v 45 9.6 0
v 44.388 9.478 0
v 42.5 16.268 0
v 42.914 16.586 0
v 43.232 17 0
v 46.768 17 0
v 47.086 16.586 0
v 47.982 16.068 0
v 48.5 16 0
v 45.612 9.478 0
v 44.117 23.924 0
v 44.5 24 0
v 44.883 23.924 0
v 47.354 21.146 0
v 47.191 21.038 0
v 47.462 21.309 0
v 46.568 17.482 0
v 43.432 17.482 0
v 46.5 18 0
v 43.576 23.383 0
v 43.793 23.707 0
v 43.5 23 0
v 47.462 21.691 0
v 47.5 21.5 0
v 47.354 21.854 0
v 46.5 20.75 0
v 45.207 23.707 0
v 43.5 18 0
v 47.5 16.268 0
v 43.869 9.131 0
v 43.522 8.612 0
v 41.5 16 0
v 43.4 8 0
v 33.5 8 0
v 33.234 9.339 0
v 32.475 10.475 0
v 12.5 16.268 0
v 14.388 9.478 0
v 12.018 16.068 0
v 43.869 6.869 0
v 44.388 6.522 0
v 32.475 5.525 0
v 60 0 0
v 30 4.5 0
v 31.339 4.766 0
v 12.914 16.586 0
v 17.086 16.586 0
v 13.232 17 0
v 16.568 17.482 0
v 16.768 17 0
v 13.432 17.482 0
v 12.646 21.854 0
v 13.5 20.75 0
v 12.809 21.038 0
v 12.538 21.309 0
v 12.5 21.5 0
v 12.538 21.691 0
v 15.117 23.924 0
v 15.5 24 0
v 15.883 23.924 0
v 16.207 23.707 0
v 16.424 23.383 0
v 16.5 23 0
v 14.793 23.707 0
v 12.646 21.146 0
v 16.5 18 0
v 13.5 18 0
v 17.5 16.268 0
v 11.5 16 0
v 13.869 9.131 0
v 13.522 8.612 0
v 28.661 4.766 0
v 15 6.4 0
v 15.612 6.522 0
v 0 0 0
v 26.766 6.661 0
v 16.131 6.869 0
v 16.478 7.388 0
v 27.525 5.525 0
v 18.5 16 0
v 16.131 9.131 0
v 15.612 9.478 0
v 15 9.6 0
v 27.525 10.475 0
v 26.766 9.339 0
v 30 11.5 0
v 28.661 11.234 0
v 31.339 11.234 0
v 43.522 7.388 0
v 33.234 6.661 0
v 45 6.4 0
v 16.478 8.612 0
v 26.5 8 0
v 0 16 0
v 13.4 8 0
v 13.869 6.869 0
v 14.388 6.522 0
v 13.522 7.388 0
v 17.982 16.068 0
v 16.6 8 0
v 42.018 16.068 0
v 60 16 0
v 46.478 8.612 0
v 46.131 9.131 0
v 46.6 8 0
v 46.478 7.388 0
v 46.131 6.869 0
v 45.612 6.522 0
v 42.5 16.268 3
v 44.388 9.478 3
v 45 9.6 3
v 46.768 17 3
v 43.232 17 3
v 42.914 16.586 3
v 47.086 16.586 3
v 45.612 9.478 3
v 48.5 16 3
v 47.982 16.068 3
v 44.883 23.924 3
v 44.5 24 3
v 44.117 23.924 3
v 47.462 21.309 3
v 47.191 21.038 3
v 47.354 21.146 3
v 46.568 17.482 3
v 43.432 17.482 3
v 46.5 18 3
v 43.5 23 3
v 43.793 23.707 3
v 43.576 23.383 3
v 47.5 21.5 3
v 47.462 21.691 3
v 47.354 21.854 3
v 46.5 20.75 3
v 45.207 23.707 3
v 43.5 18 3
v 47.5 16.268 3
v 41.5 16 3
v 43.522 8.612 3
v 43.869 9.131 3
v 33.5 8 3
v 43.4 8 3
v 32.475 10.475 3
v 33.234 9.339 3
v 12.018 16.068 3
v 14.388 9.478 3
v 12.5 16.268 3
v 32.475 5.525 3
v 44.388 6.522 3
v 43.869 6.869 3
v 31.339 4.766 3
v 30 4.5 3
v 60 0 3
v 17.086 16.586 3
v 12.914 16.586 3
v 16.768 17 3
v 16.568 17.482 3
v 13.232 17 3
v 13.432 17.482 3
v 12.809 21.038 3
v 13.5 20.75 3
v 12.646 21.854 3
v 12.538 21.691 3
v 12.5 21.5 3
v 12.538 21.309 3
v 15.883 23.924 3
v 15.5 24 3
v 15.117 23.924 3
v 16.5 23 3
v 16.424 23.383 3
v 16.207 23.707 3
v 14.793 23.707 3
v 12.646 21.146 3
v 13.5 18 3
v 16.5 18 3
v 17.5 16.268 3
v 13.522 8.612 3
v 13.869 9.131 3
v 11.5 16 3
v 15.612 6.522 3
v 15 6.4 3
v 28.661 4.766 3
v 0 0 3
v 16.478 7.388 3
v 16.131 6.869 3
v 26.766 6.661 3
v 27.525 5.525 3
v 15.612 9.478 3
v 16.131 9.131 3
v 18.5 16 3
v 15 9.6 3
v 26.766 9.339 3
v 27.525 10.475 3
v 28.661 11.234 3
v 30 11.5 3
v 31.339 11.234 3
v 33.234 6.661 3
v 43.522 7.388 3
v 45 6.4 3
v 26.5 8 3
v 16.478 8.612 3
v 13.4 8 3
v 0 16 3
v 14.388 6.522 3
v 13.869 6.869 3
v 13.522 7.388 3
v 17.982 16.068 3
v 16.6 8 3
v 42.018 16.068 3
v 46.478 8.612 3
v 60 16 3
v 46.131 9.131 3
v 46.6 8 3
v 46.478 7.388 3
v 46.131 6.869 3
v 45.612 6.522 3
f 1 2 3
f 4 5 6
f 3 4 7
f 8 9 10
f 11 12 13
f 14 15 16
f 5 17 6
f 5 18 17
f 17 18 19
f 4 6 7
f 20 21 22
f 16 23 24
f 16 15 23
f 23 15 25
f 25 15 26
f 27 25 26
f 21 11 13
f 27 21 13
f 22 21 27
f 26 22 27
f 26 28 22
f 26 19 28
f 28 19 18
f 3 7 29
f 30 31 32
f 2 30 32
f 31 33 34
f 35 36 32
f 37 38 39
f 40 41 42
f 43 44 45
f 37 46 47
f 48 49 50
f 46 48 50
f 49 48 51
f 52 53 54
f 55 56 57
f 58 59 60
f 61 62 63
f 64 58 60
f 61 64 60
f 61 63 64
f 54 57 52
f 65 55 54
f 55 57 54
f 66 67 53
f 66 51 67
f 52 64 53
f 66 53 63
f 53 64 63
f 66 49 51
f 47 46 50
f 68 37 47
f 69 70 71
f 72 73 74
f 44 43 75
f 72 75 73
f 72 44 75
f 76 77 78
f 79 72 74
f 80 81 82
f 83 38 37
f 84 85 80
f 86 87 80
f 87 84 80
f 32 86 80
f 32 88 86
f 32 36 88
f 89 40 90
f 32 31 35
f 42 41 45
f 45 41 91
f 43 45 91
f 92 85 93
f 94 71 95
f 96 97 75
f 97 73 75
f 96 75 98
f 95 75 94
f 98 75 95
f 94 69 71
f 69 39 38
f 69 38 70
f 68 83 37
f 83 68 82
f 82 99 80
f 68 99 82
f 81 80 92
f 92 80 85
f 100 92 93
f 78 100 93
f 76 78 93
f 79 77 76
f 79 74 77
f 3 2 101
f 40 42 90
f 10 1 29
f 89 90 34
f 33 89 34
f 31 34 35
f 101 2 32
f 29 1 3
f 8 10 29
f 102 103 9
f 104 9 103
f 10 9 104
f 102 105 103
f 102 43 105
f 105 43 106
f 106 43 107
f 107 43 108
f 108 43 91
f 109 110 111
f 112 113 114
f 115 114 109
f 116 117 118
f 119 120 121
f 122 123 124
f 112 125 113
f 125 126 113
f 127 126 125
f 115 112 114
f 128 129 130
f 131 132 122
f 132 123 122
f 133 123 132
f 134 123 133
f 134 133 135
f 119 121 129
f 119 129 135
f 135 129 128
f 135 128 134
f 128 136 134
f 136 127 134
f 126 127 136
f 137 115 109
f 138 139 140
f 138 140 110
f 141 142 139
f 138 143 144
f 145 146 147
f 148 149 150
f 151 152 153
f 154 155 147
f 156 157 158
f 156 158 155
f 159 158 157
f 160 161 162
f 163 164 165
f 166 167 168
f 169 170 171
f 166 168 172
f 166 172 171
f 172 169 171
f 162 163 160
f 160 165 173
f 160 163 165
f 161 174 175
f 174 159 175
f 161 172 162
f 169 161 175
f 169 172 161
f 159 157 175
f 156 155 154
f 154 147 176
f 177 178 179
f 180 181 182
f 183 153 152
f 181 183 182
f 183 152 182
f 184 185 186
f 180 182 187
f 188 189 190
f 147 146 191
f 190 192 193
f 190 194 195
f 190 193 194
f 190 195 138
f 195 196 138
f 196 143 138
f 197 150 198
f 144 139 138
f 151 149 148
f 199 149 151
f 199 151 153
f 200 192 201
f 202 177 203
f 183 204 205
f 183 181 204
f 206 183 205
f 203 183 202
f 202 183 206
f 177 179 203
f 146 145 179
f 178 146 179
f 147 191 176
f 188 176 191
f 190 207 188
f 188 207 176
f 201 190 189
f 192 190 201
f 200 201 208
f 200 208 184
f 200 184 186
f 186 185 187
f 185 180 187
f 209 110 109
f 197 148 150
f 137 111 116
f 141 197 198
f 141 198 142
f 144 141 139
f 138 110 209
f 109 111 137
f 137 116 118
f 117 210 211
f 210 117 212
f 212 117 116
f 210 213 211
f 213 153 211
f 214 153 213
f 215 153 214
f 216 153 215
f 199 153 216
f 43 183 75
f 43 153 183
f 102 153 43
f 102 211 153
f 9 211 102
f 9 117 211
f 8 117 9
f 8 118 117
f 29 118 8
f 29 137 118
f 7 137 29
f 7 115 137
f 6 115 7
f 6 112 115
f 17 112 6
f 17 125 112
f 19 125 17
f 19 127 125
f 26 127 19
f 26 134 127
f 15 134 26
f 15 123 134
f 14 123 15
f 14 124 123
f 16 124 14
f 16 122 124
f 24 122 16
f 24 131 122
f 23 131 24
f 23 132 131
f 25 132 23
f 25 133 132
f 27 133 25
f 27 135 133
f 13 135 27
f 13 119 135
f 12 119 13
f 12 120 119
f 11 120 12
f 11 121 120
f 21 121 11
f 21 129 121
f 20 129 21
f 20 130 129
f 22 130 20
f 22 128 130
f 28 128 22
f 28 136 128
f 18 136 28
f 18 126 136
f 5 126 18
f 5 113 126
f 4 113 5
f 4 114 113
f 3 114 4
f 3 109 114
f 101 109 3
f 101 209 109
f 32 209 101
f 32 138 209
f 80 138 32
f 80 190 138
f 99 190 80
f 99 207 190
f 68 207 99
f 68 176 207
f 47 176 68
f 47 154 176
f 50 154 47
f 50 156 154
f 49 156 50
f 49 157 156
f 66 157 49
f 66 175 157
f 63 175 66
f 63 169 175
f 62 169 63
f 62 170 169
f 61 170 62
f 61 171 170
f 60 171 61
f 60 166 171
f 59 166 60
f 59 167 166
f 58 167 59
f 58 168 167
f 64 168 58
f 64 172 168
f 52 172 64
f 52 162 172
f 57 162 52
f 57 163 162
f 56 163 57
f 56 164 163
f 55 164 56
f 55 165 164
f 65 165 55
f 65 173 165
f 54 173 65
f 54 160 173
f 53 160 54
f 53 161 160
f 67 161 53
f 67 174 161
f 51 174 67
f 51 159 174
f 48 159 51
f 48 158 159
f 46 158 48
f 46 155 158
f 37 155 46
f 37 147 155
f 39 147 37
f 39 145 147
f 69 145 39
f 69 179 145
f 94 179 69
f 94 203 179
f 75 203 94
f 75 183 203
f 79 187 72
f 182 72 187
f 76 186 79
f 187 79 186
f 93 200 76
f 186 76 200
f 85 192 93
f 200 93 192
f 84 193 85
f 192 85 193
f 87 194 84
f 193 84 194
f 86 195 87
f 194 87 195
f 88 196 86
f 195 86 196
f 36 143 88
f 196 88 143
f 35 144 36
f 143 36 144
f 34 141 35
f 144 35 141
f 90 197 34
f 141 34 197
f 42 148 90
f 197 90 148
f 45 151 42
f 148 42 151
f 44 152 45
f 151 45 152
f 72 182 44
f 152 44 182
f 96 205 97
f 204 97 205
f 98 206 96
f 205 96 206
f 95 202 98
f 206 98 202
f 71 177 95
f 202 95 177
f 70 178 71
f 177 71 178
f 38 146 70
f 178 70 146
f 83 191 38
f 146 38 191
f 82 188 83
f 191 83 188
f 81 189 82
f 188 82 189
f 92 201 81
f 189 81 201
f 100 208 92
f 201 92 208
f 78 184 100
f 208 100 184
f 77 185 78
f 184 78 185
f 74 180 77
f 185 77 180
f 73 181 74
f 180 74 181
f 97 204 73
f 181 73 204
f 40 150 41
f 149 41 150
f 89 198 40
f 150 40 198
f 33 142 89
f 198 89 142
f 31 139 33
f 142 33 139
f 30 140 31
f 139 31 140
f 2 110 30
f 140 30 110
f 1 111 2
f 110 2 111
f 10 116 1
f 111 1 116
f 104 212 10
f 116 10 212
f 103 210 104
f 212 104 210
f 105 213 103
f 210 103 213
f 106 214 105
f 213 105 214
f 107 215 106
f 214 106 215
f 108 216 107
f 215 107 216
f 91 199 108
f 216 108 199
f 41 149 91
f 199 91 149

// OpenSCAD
module fillet(size=3) {
  difference(){
    square([size,size]);
    
    translate([size,size,0])
    circle(size, $fn=24);
  }  
}

module prong(){
  union() {
    // Head
    translate([0.5,-0.5,0])
    hull($fn = 16){
      translate([3,6])
      circle(0.5);
      
      translate([0.5,7.5])
      circle(1);
      
      translate([-0.5,5.25])
      square([3,1]);
    }
    
    // Prong
    square([3,6]);  

    // Right fillet
    translate([3,0])    
    fillet(2);
    
    // Left fillet
    mirror([1,0,0])
    fillet(2);
  }
}

module layer(nutLongEdge=12.5, height=3, isEndLayer=true) {
  plateWidth = 60;
  plateHeight = 16;

  linear_extrude(height)
  union(){
    difference() {
      square([plateWidth,plateHeight]);    

      // M3 bolt hole 1
      translate([(plateWidth - 30)/2, plateHeight/2])
      circle(1.6,$fn=16);
      
      // M3 bolt hole 2
      translate([(plateWidth + 30)/2, plateHeight/2])
      circle(1.6,$fn=16);
      
      if(isEndLayer) {
        // 1/4" tripod bolt hole
        translate([plateWidth/2,plateHeight/2])
        circle(3.5,$fn=16);
        
      } else {          
        // Slot for 1/4" tripod nut
        translate([(plateWidth-nutLongEdge)/2, 2.5])
        square([nutLongEdge,11]);
      }
    }
   
    if(isEndLayer) {
      translate([(plateWidth + 27)/2, plateHeight])
      prong();
      
      translate([(plateWidth - 27)/2, plateHeight])
      mirror([1,0,0])
      prong();
    }
  }
}

layer();
//layer(height=8, isEndLayer = false);
